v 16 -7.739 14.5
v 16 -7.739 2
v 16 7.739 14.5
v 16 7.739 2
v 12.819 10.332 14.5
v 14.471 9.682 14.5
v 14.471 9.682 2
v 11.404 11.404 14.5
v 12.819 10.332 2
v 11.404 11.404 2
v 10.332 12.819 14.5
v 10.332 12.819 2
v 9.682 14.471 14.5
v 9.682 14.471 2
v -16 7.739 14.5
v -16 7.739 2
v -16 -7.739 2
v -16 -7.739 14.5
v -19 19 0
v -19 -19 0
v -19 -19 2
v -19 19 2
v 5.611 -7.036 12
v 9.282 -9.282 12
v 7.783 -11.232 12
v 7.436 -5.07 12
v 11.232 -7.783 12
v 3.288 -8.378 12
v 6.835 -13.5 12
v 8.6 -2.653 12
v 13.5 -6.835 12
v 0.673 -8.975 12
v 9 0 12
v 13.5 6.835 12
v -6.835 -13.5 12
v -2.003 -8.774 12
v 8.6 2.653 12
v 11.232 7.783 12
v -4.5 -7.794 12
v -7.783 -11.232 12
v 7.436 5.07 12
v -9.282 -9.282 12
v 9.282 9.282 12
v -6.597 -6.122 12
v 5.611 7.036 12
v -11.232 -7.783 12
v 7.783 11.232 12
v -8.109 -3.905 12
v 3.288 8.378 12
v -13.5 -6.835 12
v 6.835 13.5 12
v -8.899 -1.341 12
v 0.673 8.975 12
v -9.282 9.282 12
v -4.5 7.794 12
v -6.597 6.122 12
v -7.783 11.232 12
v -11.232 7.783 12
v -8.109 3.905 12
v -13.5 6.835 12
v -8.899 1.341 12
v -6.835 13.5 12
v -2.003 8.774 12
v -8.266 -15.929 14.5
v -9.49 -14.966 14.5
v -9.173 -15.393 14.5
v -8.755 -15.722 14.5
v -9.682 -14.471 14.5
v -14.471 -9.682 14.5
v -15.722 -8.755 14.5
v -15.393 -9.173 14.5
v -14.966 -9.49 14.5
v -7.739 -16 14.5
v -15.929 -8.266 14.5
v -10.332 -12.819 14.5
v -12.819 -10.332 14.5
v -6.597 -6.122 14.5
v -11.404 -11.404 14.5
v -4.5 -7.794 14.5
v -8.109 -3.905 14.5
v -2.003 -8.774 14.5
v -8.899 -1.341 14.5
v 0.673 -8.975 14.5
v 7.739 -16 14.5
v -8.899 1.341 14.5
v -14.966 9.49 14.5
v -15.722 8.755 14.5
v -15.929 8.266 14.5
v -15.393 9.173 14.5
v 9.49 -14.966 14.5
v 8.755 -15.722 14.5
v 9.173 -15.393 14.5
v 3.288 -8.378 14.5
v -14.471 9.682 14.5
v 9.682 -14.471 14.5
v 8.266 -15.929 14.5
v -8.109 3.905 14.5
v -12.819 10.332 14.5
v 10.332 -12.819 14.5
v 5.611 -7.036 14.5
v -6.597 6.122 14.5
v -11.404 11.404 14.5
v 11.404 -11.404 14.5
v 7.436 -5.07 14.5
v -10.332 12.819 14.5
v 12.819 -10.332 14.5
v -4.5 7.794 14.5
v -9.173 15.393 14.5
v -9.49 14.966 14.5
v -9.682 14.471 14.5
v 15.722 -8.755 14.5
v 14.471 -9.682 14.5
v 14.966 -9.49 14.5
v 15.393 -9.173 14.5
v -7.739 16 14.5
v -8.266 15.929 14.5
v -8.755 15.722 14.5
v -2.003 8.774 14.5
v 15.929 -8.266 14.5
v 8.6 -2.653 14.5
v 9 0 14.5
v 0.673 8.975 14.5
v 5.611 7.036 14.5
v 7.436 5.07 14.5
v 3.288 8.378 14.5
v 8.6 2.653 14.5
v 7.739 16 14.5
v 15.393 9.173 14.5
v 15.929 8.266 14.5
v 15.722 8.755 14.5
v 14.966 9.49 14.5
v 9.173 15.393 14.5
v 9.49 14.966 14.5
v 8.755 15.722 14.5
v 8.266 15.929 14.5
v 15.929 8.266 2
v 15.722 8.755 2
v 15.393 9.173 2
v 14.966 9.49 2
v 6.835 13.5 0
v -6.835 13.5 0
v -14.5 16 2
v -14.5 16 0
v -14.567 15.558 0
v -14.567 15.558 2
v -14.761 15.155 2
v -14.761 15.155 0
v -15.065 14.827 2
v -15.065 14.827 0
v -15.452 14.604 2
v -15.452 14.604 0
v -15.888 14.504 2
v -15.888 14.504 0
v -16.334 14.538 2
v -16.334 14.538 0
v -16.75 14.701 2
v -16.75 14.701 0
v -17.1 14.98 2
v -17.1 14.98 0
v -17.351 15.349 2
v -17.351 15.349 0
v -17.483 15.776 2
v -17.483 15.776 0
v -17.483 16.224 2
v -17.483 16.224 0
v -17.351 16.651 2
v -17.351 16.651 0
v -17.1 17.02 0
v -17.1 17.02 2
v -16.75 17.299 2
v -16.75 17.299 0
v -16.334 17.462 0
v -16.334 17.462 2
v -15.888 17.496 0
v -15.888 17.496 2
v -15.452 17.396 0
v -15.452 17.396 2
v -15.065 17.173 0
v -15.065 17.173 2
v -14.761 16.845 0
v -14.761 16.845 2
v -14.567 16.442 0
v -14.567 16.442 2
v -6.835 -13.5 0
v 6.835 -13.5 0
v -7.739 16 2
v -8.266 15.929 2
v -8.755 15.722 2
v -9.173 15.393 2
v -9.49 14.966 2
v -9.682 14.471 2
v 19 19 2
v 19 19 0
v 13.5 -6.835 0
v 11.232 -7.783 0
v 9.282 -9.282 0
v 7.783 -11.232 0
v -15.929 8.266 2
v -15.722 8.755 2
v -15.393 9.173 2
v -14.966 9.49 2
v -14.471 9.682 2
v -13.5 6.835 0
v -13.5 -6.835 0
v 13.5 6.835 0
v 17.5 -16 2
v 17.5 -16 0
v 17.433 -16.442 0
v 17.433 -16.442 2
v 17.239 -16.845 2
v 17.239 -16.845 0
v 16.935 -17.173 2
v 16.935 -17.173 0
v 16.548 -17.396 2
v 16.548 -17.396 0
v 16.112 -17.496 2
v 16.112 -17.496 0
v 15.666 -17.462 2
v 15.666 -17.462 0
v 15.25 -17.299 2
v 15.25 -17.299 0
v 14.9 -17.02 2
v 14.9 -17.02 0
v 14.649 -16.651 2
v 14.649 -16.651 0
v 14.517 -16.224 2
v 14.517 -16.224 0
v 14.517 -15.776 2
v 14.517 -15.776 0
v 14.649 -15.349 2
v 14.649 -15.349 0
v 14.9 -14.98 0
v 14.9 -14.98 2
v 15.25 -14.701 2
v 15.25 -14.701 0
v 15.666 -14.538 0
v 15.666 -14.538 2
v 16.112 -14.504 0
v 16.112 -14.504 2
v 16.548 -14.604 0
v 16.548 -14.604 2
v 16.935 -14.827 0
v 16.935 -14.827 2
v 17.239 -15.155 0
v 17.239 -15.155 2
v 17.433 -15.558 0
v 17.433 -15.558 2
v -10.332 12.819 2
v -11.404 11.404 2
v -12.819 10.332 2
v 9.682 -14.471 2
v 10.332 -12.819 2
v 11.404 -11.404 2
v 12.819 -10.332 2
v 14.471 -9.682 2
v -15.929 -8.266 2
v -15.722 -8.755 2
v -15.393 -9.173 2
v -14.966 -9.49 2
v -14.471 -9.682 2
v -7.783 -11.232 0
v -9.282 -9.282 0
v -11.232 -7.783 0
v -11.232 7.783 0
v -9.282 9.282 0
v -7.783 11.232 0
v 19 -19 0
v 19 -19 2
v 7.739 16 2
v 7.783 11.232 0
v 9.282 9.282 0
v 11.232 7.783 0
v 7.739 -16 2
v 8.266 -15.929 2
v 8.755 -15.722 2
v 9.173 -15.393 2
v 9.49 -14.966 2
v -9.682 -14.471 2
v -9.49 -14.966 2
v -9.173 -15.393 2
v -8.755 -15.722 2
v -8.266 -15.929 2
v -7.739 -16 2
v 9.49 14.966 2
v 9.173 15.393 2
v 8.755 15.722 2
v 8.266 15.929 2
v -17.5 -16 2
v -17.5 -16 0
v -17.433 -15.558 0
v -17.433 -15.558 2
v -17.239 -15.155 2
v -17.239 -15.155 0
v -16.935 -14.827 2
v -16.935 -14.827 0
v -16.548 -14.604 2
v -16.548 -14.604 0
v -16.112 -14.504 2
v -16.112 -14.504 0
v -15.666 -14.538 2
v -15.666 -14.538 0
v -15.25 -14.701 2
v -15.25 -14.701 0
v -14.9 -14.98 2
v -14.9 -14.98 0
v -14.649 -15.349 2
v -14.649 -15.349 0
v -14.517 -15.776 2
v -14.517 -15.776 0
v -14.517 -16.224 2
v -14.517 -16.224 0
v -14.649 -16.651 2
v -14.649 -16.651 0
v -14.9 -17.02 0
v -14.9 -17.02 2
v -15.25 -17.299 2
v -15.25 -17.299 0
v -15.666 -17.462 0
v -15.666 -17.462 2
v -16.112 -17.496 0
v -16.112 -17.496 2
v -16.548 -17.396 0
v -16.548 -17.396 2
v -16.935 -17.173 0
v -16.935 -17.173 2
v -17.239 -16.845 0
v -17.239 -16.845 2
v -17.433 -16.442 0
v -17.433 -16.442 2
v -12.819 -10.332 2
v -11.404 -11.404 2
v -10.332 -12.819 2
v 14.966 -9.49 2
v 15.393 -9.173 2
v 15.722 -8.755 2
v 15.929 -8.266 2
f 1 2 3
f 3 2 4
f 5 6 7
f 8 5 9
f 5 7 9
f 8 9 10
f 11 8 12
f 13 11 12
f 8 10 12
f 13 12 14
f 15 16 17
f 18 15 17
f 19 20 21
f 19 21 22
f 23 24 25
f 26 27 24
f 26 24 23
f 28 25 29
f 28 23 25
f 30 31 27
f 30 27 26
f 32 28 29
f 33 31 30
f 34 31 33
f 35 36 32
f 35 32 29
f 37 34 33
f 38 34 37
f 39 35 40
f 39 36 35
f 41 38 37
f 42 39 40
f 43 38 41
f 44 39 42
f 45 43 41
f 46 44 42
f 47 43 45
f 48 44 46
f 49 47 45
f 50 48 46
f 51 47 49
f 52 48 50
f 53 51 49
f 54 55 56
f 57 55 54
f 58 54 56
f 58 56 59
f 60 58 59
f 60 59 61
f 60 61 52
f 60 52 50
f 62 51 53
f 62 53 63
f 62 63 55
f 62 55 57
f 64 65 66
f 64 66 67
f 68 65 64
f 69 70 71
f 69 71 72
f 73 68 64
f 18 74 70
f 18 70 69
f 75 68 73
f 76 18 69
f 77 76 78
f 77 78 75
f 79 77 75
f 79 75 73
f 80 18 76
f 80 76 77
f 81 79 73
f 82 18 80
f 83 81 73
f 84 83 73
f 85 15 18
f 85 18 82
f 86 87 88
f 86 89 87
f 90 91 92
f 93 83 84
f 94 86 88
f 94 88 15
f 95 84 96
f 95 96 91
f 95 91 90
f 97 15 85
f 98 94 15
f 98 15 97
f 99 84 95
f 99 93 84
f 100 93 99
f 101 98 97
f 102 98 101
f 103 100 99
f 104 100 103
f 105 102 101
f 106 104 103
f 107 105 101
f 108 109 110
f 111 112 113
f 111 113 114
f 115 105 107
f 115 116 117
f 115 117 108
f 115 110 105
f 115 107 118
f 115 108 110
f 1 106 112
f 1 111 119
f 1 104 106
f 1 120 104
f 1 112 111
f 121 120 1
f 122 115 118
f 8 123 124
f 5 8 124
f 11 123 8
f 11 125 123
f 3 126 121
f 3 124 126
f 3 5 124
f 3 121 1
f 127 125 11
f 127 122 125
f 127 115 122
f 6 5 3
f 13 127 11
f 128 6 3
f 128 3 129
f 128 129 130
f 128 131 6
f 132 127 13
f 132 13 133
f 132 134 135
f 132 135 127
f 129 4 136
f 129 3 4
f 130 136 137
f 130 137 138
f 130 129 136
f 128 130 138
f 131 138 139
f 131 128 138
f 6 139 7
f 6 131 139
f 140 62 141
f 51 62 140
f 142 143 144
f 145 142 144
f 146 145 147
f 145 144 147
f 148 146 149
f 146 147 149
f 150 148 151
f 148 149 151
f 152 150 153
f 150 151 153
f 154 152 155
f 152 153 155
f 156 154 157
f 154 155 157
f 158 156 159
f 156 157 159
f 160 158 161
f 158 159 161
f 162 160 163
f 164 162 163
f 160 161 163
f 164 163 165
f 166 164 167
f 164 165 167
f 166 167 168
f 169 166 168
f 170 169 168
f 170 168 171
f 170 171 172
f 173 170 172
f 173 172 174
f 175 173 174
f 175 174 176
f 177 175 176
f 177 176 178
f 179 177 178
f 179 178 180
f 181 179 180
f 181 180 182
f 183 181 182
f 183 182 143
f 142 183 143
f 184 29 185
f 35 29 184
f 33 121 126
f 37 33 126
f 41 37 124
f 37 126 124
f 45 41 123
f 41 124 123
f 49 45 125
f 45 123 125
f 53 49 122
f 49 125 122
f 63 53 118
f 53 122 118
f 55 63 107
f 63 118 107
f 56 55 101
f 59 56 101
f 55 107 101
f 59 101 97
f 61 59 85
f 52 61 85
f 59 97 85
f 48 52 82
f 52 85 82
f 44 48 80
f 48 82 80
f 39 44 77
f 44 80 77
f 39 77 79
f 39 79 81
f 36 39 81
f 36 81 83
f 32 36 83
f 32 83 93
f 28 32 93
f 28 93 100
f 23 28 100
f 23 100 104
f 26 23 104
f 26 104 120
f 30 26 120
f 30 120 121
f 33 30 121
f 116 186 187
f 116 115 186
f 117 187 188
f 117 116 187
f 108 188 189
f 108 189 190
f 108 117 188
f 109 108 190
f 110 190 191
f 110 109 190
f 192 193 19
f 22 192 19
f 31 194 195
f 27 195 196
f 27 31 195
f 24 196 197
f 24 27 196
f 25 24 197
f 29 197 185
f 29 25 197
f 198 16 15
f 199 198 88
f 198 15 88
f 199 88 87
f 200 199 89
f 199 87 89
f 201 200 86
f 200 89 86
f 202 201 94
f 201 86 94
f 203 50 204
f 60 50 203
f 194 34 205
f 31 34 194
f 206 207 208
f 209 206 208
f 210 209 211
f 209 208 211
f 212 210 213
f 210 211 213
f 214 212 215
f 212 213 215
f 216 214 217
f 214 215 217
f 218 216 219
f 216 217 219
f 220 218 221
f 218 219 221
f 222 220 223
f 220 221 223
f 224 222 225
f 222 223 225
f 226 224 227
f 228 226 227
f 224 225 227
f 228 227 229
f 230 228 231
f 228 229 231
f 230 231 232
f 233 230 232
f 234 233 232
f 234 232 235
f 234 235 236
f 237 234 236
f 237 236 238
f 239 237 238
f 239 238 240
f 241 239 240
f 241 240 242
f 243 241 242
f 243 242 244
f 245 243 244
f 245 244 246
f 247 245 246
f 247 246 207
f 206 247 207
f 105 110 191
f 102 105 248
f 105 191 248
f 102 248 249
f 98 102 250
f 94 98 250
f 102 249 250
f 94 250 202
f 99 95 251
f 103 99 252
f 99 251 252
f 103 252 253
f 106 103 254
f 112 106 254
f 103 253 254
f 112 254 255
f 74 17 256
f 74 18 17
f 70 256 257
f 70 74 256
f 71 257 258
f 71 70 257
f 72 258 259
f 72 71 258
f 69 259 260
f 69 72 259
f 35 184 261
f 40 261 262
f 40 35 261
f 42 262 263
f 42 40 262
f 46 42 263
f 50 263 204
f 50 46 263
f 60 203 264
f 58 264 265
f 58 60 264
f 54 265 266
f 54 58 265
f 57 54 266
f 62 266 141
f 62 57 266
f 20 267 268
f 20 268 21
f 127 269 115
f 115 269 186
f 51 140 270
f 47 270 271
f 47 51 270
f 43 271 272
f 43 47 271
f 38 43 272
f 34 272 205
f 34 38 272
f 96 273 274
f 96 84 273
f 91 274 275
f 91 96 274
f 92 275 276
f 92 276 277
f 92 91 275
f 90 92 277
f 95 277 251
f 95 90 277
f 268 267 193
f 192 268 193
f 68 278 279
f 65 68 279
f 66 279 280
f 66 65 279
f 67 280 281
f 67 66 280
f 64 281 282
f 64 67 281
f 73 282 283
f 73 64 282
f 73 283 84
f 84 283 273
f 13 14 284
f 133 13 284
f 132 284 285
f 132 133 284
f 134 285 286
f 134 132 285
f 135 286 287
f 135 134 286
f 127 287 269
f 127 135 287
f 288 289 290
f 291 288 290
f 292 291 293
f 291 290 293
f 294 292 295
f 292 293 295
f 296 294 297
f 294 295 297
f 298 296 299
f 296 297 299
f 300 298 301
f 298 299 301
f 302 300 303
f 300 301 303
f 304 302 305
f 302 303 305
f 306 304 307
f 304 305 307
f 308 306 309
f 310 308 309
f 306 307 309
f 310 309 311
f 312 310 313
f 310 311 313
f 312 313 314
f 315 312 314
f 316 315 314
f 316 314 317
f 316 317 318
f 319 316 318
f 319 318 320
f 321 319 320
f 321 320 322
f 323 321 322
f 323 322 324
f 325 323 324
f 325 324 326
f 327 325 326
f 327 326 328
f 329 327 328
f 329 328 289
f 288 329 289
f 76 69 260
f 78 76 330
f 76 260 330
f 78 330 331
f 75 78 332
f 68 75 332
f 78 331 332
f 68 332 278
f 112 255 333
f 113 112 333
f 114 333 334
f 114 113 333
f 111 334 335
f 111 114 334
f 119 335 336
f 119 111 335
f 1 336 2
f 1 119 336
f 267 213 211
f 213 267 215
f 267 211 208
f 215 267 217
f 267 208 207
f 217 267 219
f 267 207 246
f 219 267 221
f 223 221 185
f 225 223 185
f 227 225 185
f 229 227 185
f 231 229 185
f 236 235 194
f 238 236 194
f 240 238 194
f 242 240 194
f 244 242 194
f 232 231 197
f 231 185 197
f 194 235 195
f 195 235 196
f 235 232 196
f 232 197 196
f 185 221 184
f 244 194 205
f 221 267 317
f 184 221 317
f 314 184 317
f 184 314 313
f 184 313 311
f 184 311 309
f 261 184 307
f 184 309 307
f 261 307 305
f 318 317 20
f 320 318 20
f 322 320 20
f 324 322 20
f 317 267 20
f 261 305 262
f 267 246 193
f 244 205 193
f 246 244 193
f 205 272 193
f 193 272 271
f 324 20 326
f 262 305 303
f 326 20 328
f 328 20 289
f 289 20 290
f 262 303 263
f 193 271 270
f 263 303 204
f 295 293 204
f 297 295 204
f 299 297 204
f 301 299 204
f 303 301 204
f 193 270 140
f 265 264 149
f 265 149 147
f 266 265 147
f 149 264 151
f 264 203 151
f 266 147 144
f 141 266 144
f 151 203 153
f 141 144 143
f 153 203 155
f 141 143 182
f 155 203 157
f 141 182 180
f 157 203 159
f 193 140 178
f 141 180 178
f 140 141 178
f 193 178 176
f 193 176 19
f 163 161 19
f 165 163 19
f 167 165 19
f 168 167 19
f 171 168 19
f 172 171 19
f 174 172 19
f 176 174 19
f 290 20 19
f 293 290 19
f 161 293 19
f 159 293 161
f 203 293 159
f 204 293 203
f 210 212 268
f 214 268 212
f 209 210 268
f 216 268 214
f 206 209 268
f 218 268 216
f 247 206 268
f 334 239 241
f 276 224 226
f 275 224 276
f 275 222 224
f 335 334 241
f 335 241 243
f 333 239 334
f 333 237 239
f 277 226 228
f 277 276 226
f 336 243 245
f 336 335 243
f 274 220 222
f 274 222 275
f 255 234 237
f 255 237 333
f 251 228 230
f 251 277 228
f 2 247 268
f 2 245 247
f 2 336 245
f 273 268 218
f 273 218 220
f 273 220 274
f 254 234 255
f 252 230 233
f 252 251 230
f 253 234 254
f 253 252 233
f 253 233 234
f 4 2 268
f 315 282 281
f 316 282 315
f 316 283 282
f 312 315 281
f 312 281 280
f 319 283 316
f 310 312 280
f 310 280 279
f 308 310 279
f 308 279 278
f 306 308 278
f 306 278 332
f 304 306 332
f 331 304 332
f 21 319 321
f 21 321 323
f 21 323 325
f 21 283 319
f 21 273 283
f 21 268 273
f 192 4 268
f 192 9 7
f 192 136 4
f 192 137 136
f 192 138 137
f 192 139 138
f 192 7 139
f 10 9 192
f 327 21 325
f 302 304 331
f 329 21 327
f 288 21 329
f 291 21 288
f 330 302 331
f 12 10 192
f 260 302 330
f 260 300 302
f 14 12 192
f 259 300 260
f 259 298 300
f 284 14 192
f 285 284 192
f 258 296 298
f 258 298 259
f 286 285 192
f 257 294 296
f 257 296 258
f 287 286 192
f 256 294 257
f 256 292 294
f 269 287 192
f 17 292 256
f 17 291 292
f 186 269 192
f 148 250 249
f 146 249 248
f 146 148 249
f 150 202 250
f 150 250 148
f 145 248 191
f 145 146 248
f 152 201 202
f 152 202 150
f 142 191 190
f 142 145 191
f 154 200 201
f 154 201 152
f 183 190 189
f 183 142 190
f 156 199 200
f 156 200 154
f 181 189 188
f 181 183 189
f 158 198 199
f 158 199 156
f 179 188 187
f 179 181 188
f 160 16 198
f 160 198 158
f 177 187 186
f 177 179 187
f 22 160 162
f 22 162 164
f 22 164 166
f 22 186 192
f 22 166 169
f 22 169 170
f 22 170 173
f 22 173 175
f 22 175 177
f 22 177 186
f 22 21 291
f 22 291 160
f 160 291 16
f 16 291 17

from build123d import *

# Parameters (mm, degrees)
SKETCH1_W           = 38
SKETCH1_H           = 38
BOSS_EXTRUDE1_DEPTH = 2
SKETCH2_R           = 1.5
CUT_EXTRUDE1_DEPTH  = 27.944387171
BOSS_EXTRUDE2_DEPTH = 12.5
SKETCH4_R           = 9
CUT_EXTRUDE2_DEPTH  = 31.532769282
CUT_EXTRUDE3_START  = -2.5
CUT_EXTRUDE3_DEPTH  = 29.032769282
FILLET1_R           = 2


with BuildPart() as part:
    # Sketch1 → Boss-Extrude1 (new body)
    with BuildSketch(Plane(origin=(0, 0, 0), x_dir=(0, 1, 0), z_dir=(0, 0, 1))):
        Rectangle(SKETCH1_W, SKETCH1_H)
    extrude(amount=BOSS_EXTRUDE1_DEPTH)

    # Sketch2 → Cut-Extrude1 (cut, through all)
    with BuildSketch(Plane(origin=(0, 0, 0), x_dir=(1, 0, 0), z_dir=(0, 0, -1))):
        with Locations(Location((-16, 16, 0), (0, 0, 180))):
            Circle(SKETCH2_R)
        with Locations((-16, -16)):
            Circle(SKETCH2_R)
        with Locations((16, 16)):
            Circle(SKETCH2_R)
    extrude(amount=-CUT_EXTRUDE1_DEPTH, mode=Mode.SUBTRACT)

    # Sketch3 → Boss-Extrude2 (add)
    with BuildSketch(Plane.XY.offset(2)):
        with BuildLine():
            Line((-16, 9.5), (-16, -9.5))
            ThreePointArc((-16, -9.5), (-11.403805922, -11.403805922), (-9.5, -16))
            Line((-9.5, -16), (9.5, -16))
            ThreePointArc((9.5, -16), (11.403805922, -11.403805922), (16, -9.5))
            Line((16, -9.5), (16, 9.5))
            ThreePointArc((16, 9.5), (11.403805922, 11.403805922), (9.5, 16))
            Line((9.5, 16), (-9.5, 16))
            ThreePointArc((-9.5, 16), (-11.403805922, 11.403805922), (-16, 9.5))
        make_face()
    extrude(amount=BOSS_EXTRUDE2_DEPTH)

    # Sketch4 → Cut-Extrude2 (cut, through all)
    with BuildSketch(Plane.XY.offset(14.5)):
        Circle(SKETCH4_R)
    extrude(amount=-CUT_EXTRUDE2_DEPTH, mode=Mode.SUBTRACT)

    # Sketch5 → Cut-Extrude3 (cut, through all)
    with BuildSketch(Plane.XY.offset(14.5).offset(CUT_EXTRUDE3_START)):
        with BuildLine():
            Line((-13.5, -6.83484861), (-13.5, 6.83484861))
            ThreePointArc((-13.5, 6.83484861), (-9.282485579, 9.282485579), (-6.83484861, 13.5))
            Line((-6.83484861, 13.5), (6.83484861, 13.5))
            ThreePointArc((6.83484861, 13.5), (9.282485579, 9.282485579), (13.5, 6.83484861))
            Line((13.5, 6.83484861), (13.5, -6.83484861))
            ThreePointArc((13.5, -6.83484861), (9.282485579, -9.282485579), (6.83484861, -13.5))
            Line((6.83484861, -13.5), (-6.83484861, -13.5))
            ThreePointArc((-6.83484861, -13.5), (-9.282485579, -9.282485579), (-13.5, -6.83484861))
        make_face()
    extrude(amount=-CUT_EXTRUDE3_DEPTH, mode=Mode.SUBTRACT)

    # Fillet1
    fillet1_edges = [part.edges().sort_by_distance(p)[0] for p in [
        (-9.5, 16, 8.25),
        (-16, 9.5, 8.25),
        (-16, -9.5, 8.25),
        (-9.5, -16, 8.25),
        (9.5, -16, 8.25),
        (16, -9.5, 8.25),
        (16, 9.5, 8.25),
        (9.5, 16, 8.25),
    ]]
    fillet(fillet1_edges, radius=FILLET1_R)


solid = part.part
